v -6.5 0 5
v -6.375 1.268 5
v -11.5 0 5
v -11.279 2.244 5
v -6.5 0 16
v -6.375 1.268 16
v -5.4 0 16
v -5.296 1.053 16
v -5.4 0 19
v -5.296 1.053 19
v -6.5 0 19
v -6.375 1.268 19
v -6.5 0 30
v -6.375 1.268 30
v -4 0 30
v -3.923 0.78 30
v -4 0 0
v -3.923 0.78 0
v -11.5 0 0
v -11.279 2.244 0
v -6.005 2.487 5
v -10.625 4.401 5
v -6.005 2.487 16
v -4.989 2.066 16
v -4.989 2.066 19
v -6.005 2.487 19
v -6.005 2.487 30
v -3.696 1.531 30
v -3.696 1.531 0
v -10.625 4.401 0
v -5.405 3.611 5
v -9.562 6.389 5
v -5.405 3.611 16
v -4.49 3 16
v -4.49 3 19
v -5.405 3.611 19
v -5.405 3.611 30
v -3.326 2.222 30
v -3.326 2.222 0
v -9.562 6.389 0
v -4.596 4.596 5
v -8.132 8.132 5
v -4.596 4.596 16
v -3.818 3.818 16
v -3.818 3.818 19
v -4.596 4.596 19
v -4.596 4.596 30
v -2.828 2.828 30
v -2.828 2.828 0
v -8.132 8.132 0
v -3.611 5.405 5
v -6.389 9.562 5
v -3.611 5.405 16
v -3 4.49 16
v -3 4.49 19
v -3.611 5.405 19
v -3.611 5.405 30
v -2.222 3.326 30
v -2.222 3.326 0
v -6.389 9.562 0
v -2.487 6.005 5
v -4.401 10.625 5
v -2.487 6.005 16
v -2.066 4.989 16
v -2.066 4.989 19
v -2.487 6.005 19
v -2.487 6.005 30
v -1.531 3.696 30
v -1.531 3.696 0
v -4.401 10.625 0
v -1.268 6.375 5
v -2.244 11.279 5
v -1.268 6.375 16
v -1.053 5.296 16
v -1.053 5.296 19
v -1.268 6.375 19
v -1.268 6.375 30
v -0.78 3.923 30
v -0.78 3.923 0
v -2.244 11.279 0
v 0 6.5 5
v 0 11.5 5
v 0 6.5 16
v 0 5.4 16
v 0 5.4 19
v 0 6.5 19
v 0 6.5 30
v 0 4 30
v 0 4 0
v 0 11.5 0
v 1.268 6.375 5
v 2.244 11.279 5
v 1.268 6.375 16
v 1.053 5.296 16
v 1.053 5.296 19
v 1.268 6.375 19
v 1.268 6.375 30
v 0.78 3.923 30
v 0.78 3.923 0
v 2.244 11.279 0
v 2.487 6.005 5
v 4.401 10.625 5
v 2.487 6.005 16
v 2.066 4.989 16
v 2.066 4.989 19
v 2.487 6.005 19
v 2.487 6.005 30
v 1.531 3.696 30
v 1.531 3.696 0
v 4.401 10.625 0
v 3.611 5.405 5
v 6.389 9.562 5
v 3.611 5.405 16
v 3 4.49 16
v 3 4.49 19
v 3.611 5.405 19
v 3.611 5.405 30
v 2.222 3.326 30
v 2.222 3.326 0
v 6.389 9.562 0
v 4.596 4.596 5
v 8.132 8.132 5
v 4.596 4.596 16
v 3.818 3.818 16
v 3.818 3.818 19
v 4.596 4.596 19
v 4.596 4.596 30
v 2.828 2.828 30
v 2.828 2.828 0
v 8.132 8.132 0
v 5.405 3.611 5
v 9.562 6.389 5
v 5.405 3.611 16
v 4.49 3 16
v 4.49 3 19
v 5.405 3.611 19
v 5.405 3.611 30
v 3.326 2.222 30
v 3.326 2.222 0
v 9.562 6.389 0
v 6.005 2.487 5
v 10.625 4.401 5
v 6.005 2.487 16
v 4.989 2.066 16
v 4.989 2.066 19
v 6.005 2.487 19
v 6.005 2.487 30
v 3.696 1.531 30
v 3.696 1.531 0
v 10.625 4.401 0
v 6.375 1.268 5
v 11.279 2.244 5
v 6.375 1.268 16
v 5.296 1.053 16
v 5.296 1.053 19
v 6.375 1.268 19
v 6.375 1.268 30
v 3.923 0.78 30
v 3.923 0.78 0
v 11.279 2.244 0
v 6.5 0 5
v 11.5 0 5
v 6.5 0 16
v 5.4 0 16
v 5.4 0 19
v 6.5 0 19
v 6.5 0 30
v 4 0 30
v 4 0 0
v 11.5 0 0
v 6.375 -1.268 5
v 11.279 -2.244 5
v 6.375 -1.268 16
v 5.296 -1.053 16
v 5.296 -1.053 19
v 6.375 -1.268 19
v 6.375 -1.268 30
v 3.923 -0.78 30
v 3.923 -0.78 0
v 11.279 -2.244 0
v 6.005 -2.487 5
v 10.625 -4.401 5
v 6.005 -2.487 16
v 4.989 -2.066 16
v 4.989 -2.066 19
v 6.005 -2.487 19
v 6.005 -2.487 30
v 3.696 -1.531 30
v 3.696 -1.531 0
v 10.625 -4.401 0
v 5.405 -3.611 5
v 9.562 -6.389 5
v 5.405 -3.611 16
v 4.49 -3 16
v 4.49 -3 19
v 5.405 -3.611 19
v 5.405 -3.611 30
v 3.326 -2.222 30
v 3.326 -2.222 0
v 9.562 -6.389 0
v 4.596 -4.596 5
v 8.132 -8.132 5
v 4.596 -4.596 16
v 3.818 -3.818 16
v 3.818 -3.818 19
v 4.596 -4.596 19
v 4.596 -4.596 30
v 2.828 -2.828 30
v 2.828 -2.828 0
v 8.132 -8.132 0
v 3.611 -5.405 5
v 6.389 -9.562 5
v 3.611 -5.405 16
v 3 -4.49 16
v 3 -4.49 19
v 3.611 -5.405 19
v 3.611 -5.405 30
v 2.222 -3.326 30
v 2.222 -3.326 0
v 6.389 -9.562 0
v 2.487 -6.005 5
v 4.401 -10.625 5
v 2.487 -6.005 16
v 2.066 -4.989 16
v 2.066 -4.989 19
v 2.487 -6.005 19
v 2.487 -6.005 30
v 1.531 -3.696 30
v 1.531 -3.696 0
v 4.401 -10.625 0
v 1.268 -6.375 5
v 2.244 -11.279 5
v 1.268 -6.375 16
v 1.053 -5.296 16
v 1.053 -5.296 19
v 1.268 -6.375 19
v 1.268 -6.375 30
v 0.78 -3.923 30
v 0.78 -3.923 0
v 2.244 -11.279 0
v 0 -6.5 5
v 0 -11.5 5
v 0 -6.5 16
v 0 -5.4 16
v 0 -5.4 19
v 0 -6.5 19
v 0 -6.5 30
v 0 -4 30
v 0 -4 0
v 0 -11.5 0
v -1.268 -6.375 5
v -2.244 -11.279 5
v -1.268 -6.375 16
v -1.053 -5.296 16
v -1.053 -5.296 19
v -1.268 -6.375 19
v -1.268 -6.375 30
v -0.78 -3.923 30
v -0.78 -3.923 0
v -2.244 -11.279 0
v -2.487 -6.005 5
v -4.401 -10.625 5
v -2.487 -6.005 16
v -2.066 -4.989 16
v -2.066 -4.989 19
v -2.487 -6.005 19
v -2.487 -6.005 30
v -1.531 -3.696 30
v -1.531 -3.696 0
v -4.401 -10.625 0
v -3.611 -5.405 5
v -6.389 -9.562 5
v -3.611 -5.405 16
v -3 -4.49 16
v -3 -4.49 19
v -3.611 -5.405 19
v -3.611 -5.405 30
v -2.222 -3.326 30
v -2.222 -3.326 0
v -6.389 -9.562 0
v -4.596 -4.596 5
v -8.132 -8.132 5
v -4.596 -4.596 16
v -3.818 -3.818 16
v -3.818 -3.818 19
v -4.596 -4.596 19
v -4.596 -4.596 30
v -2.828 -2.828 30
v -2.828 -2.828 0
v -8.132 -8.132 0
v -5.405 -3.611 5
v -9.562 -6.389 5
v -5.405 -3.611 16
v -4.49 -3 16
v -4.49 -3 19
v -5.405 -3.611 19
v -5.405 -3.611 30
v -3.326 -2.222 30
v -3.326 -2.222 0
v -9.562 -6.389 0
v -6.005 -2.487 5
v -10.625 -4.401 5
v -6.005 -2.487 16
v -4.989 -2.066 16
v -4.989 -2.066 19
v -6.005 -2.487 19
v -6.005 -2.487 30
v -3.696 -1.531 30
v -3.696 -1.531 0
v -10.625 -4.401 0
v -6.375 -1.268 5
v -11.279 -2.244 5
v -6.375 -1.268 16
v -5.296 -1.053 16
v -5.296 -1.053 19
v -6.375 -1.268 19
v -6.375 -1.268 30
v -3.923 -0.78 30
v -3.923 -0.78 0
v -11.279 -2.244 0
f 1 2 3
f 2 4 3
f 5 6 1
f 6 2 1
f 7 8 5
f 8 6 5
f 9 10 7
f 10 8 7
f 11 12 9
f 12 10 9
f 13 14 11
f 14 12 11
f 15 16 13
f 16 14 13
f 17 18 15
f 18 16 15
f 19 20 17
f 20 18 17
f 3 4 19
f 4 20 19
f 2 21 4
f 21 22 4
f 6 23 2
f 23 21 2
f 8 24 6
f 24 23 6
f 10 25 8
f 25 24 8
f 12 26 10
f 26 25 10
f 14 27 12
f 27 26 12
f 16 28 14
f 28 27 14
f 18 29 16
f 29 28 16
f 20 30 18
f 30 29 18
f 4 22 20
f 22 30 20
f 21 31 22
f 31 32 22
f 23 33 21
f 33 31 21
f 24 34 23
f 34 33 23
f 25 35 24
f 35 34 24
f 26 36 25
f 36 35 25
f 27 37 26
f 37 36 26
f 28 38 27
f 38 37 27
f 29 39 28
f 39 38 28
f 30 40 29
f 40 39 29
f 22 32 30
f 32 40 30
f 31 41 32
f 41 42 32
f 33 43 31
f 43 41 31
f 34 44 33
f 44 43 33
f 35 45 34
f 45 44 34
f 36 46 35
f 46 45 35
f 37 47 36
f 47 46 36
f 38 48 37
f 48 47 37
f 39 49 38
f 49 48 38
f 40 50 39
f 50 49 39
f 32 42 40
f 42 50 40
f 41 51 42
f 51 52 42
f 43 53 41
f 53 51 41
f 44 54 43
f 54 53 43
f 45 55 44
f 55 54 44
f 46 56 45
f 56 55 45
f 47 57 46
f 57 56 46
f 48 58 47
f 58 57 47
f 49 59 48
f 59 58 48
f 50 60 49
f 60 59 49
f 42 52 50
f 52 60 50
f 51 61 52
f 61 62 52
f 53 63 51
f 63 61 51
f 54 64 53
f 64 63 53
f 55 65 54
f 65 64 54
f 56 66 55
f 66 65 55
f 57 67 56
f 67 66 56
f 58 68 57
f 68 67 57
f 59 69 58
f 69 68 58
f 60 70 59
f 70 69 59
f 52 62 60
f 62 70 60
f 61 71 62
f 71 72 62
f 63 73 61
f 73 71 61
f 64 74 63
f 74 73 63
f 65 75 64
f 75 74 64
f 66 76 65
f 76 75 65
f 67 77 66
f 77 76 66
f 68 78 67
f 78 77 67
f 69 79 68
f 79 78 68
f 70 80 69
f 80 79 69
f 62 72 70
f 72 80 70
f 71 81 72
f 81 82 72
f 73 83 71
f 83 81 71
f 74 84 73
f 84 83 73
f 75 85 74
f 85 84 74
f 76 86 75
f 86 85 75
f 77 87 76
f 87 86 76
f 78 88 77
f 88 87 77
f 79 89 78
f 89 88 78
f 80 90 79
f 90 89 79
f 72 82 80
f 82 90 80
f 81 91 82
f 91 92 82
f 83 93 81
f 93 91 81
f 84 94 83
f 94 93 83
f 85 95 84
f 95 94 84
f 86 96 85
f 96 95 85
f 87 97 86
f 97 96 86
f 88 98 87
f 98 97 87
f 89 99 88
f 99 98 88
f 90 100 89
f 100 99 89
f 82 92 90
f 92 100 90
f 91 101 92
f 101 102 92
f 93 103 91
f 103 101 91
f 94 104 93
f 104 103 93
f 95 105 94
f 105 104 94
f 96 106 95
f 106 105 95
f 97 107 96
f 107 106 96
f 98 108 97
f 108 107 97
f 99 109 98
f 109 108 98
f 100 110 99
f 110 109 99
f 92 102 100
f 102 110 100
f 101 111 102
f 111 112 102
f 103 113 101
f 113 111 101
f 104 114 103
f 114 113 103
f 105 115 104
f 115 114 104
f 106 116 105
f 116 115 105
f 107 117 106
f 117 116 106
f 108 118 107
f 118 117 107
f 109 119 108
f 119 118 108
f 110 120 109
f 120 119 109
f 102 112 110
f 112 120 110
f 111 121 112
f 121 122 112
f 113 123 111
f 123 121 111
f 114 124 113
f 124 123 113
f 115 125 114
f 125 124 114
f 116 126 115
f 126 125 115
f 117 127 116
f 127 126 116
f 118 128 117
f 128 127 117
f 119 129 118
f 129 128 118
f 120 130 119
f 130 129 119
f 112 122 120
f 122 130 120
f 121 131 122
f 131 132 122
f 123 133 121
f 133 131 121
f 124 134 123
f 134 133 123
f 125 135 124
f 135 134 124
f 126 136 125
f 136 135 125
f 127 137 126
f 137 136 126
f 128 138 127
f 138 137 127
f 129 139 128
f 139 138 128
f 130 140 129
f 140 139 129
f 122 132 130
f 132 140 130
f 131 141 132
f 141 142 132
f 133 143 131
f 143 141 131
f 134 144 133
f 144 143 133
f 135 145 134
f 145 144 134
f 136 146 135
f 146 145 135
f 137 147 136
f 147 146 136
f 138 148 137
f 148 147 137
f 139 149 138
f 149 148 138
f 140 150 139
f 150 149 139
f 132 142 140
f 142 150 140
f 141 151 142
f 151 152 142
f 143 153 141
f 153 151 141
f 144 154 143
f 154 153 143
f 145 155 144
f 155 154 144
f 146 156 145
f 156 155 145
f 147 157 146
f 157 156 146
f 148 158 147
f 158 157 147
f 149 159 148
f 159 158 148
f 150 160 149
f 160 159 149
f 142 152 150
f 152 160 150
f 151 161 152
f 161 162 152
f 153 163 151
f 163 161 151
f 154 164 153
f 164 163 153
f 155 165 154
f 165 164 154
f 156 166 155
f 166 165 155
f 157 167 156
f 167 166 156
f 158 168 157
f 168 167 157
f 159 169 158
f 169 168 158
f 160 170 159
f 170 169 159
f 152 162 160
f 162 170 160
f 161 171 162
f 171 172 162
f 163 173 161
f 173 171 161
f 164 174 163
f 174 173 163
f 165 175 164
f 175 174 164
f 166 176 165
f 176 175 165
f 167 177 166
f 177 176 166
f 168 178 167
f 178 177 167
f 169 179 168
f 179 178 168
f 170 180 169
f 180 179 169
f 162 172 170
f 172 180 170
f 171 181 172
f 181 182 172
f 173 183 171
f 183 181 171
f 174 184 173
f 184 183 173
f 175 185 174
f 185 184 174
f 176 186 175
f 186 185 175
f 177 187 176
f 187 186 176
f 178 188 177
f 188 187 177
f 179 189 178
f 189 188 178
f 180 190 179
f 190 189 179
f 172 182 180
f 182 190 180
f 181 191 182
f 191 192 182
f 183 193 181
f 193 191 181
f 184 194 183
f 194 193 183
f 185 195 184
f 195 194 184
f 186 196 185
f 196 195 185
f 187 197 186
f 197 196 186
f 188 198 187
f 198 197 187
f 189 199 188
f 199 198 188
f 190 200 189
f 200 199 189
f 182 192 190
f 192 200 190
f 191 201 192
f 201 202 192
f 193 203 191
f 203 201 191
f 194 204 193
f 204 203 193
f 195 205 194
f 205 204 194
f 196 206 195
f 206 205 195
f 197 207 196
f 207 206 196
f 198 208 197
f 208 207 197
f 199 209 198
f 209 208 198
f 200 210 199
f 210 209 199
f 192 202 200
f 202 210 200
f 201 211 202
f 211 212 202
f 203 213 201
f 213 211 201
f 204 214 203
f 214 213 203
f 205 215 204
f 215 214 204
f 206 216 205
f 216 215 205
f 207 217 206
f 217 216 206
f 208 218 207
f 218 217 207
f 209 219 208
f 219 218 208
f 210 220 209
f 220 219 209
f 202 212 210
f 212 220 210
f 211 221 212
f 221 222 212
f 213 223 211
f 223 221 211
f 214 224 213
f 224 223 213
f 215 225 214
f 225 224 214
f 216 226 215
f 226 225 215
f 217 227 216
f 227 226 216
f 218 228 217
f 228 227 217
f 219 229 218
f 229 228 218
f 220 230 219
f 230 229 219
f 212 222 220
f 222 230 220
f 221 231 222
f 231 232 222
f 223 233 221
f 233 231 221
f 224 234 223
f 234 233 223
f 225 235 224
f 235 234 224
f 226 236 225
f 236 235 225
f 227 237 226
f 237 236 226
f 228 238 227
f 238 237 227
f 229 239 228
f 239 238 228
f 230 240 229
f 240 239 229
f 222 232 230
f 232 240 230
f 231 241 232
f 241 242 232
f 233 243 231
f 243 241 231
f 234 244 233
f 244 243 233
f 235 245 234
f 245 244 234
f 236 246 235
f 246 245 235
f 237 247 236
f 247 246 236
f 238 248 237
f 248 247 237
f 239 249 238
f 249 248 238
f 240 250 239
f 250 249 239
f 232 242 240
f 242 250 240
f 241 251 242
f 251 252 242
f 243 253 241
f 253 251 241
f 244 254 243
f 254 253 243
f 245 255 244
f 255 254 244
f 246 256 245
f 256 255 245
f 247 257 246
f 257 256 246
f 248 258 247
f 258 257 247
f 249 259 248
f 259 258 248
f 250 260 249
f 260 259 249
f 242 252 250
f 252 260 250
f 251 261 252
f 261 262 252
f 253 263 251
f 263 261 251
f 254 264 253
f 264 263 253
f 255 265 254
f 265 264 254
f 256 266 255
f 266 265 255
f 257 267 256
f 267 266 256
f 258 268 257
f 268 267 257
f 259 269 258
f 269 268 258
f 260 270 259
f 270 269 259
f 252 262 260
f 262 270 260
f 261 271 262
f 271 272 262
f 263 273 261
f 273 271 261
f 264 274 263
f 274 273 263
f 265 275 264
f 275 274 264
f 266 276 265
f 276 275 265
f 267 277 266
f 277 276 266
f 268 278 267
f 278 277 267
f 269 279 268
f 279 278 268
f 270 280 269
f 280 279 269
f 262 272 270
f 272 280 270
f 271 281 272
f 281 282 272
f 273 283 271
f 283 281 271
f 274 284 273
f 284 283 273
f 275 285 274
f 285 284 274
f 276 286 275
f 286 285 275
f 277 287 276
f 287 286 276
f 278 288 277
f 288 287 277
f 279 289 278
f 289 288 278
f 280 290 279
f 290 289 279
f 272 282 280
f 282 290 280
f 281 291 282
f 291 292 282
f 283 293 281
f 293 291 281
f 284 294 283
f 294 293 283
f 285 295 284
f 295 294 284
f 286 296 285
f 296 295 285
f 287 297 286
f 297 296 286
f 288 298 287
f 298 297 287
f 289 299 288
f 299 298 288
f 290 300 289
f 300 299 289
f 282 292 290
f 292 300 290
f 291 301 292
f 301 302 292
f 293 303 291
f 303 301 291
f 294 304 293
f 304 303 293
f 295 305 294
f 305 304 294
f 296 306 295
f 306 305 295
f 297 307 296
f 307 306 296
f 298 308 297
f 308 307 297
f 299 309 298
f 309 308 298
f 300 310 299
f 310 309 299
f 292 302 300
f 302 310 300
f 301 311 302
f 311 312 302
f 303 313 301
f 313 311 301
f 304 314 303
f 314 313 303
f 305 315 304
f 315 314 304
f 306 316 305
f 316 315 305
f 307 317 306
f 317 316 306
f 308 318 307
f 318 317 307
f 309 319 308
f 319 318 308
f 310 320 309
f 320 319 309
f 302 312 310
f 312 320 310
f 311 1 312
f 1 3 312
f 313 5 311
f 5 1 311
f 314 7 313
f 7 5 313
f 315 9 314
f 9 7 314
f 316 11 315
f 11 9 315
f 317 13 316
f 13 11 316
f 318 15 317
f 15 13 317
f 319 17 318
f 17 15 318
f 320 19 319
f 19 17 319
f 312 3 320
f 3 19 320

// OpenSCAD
$fn = 32;

// ----------------------------------------------------------------------
// Grooved revolve: flanged, bore R4
// ----------------------------------------------------------------------

// --- parameters (mm) ---
bore_r = 4;               // bore radius
outer_r = 6.5;            // outer radius of the body
total_h = 30;             // overall height, Z
wall = 2.5;               // radial wall thickness
groove_w = 3;             // groove width
groove_d = 1.1;           // groove depth
grooves = 1;              // number of outer grooves
flange_r = 11.5;          // flange radius
flange_h = 5;             // flange height

bbox_x = 2 * flange_r;  // full diameter
bore_d = 2 * bore_r;  // bore diameter
body_d = 2 * outer_r;  // body diameter
flange_d = 2 * flange_r;  // flange diameter
revolve_angle = 360;  // full turn around the Z axis

profile = [[4, 0], [6.5, 0], [11.5, 0], [11.5, 5], [6.5, 5], [6.5, 16], [5.4, 16], [5.4, 19], [6.5, 19], [6.5, 30], [4, 30]];  // primary outline, 11 points, counter clockwise

// --- the one profile operation ---
rotate_extrude(angle = revolve_angle) polygon(points = profile);
